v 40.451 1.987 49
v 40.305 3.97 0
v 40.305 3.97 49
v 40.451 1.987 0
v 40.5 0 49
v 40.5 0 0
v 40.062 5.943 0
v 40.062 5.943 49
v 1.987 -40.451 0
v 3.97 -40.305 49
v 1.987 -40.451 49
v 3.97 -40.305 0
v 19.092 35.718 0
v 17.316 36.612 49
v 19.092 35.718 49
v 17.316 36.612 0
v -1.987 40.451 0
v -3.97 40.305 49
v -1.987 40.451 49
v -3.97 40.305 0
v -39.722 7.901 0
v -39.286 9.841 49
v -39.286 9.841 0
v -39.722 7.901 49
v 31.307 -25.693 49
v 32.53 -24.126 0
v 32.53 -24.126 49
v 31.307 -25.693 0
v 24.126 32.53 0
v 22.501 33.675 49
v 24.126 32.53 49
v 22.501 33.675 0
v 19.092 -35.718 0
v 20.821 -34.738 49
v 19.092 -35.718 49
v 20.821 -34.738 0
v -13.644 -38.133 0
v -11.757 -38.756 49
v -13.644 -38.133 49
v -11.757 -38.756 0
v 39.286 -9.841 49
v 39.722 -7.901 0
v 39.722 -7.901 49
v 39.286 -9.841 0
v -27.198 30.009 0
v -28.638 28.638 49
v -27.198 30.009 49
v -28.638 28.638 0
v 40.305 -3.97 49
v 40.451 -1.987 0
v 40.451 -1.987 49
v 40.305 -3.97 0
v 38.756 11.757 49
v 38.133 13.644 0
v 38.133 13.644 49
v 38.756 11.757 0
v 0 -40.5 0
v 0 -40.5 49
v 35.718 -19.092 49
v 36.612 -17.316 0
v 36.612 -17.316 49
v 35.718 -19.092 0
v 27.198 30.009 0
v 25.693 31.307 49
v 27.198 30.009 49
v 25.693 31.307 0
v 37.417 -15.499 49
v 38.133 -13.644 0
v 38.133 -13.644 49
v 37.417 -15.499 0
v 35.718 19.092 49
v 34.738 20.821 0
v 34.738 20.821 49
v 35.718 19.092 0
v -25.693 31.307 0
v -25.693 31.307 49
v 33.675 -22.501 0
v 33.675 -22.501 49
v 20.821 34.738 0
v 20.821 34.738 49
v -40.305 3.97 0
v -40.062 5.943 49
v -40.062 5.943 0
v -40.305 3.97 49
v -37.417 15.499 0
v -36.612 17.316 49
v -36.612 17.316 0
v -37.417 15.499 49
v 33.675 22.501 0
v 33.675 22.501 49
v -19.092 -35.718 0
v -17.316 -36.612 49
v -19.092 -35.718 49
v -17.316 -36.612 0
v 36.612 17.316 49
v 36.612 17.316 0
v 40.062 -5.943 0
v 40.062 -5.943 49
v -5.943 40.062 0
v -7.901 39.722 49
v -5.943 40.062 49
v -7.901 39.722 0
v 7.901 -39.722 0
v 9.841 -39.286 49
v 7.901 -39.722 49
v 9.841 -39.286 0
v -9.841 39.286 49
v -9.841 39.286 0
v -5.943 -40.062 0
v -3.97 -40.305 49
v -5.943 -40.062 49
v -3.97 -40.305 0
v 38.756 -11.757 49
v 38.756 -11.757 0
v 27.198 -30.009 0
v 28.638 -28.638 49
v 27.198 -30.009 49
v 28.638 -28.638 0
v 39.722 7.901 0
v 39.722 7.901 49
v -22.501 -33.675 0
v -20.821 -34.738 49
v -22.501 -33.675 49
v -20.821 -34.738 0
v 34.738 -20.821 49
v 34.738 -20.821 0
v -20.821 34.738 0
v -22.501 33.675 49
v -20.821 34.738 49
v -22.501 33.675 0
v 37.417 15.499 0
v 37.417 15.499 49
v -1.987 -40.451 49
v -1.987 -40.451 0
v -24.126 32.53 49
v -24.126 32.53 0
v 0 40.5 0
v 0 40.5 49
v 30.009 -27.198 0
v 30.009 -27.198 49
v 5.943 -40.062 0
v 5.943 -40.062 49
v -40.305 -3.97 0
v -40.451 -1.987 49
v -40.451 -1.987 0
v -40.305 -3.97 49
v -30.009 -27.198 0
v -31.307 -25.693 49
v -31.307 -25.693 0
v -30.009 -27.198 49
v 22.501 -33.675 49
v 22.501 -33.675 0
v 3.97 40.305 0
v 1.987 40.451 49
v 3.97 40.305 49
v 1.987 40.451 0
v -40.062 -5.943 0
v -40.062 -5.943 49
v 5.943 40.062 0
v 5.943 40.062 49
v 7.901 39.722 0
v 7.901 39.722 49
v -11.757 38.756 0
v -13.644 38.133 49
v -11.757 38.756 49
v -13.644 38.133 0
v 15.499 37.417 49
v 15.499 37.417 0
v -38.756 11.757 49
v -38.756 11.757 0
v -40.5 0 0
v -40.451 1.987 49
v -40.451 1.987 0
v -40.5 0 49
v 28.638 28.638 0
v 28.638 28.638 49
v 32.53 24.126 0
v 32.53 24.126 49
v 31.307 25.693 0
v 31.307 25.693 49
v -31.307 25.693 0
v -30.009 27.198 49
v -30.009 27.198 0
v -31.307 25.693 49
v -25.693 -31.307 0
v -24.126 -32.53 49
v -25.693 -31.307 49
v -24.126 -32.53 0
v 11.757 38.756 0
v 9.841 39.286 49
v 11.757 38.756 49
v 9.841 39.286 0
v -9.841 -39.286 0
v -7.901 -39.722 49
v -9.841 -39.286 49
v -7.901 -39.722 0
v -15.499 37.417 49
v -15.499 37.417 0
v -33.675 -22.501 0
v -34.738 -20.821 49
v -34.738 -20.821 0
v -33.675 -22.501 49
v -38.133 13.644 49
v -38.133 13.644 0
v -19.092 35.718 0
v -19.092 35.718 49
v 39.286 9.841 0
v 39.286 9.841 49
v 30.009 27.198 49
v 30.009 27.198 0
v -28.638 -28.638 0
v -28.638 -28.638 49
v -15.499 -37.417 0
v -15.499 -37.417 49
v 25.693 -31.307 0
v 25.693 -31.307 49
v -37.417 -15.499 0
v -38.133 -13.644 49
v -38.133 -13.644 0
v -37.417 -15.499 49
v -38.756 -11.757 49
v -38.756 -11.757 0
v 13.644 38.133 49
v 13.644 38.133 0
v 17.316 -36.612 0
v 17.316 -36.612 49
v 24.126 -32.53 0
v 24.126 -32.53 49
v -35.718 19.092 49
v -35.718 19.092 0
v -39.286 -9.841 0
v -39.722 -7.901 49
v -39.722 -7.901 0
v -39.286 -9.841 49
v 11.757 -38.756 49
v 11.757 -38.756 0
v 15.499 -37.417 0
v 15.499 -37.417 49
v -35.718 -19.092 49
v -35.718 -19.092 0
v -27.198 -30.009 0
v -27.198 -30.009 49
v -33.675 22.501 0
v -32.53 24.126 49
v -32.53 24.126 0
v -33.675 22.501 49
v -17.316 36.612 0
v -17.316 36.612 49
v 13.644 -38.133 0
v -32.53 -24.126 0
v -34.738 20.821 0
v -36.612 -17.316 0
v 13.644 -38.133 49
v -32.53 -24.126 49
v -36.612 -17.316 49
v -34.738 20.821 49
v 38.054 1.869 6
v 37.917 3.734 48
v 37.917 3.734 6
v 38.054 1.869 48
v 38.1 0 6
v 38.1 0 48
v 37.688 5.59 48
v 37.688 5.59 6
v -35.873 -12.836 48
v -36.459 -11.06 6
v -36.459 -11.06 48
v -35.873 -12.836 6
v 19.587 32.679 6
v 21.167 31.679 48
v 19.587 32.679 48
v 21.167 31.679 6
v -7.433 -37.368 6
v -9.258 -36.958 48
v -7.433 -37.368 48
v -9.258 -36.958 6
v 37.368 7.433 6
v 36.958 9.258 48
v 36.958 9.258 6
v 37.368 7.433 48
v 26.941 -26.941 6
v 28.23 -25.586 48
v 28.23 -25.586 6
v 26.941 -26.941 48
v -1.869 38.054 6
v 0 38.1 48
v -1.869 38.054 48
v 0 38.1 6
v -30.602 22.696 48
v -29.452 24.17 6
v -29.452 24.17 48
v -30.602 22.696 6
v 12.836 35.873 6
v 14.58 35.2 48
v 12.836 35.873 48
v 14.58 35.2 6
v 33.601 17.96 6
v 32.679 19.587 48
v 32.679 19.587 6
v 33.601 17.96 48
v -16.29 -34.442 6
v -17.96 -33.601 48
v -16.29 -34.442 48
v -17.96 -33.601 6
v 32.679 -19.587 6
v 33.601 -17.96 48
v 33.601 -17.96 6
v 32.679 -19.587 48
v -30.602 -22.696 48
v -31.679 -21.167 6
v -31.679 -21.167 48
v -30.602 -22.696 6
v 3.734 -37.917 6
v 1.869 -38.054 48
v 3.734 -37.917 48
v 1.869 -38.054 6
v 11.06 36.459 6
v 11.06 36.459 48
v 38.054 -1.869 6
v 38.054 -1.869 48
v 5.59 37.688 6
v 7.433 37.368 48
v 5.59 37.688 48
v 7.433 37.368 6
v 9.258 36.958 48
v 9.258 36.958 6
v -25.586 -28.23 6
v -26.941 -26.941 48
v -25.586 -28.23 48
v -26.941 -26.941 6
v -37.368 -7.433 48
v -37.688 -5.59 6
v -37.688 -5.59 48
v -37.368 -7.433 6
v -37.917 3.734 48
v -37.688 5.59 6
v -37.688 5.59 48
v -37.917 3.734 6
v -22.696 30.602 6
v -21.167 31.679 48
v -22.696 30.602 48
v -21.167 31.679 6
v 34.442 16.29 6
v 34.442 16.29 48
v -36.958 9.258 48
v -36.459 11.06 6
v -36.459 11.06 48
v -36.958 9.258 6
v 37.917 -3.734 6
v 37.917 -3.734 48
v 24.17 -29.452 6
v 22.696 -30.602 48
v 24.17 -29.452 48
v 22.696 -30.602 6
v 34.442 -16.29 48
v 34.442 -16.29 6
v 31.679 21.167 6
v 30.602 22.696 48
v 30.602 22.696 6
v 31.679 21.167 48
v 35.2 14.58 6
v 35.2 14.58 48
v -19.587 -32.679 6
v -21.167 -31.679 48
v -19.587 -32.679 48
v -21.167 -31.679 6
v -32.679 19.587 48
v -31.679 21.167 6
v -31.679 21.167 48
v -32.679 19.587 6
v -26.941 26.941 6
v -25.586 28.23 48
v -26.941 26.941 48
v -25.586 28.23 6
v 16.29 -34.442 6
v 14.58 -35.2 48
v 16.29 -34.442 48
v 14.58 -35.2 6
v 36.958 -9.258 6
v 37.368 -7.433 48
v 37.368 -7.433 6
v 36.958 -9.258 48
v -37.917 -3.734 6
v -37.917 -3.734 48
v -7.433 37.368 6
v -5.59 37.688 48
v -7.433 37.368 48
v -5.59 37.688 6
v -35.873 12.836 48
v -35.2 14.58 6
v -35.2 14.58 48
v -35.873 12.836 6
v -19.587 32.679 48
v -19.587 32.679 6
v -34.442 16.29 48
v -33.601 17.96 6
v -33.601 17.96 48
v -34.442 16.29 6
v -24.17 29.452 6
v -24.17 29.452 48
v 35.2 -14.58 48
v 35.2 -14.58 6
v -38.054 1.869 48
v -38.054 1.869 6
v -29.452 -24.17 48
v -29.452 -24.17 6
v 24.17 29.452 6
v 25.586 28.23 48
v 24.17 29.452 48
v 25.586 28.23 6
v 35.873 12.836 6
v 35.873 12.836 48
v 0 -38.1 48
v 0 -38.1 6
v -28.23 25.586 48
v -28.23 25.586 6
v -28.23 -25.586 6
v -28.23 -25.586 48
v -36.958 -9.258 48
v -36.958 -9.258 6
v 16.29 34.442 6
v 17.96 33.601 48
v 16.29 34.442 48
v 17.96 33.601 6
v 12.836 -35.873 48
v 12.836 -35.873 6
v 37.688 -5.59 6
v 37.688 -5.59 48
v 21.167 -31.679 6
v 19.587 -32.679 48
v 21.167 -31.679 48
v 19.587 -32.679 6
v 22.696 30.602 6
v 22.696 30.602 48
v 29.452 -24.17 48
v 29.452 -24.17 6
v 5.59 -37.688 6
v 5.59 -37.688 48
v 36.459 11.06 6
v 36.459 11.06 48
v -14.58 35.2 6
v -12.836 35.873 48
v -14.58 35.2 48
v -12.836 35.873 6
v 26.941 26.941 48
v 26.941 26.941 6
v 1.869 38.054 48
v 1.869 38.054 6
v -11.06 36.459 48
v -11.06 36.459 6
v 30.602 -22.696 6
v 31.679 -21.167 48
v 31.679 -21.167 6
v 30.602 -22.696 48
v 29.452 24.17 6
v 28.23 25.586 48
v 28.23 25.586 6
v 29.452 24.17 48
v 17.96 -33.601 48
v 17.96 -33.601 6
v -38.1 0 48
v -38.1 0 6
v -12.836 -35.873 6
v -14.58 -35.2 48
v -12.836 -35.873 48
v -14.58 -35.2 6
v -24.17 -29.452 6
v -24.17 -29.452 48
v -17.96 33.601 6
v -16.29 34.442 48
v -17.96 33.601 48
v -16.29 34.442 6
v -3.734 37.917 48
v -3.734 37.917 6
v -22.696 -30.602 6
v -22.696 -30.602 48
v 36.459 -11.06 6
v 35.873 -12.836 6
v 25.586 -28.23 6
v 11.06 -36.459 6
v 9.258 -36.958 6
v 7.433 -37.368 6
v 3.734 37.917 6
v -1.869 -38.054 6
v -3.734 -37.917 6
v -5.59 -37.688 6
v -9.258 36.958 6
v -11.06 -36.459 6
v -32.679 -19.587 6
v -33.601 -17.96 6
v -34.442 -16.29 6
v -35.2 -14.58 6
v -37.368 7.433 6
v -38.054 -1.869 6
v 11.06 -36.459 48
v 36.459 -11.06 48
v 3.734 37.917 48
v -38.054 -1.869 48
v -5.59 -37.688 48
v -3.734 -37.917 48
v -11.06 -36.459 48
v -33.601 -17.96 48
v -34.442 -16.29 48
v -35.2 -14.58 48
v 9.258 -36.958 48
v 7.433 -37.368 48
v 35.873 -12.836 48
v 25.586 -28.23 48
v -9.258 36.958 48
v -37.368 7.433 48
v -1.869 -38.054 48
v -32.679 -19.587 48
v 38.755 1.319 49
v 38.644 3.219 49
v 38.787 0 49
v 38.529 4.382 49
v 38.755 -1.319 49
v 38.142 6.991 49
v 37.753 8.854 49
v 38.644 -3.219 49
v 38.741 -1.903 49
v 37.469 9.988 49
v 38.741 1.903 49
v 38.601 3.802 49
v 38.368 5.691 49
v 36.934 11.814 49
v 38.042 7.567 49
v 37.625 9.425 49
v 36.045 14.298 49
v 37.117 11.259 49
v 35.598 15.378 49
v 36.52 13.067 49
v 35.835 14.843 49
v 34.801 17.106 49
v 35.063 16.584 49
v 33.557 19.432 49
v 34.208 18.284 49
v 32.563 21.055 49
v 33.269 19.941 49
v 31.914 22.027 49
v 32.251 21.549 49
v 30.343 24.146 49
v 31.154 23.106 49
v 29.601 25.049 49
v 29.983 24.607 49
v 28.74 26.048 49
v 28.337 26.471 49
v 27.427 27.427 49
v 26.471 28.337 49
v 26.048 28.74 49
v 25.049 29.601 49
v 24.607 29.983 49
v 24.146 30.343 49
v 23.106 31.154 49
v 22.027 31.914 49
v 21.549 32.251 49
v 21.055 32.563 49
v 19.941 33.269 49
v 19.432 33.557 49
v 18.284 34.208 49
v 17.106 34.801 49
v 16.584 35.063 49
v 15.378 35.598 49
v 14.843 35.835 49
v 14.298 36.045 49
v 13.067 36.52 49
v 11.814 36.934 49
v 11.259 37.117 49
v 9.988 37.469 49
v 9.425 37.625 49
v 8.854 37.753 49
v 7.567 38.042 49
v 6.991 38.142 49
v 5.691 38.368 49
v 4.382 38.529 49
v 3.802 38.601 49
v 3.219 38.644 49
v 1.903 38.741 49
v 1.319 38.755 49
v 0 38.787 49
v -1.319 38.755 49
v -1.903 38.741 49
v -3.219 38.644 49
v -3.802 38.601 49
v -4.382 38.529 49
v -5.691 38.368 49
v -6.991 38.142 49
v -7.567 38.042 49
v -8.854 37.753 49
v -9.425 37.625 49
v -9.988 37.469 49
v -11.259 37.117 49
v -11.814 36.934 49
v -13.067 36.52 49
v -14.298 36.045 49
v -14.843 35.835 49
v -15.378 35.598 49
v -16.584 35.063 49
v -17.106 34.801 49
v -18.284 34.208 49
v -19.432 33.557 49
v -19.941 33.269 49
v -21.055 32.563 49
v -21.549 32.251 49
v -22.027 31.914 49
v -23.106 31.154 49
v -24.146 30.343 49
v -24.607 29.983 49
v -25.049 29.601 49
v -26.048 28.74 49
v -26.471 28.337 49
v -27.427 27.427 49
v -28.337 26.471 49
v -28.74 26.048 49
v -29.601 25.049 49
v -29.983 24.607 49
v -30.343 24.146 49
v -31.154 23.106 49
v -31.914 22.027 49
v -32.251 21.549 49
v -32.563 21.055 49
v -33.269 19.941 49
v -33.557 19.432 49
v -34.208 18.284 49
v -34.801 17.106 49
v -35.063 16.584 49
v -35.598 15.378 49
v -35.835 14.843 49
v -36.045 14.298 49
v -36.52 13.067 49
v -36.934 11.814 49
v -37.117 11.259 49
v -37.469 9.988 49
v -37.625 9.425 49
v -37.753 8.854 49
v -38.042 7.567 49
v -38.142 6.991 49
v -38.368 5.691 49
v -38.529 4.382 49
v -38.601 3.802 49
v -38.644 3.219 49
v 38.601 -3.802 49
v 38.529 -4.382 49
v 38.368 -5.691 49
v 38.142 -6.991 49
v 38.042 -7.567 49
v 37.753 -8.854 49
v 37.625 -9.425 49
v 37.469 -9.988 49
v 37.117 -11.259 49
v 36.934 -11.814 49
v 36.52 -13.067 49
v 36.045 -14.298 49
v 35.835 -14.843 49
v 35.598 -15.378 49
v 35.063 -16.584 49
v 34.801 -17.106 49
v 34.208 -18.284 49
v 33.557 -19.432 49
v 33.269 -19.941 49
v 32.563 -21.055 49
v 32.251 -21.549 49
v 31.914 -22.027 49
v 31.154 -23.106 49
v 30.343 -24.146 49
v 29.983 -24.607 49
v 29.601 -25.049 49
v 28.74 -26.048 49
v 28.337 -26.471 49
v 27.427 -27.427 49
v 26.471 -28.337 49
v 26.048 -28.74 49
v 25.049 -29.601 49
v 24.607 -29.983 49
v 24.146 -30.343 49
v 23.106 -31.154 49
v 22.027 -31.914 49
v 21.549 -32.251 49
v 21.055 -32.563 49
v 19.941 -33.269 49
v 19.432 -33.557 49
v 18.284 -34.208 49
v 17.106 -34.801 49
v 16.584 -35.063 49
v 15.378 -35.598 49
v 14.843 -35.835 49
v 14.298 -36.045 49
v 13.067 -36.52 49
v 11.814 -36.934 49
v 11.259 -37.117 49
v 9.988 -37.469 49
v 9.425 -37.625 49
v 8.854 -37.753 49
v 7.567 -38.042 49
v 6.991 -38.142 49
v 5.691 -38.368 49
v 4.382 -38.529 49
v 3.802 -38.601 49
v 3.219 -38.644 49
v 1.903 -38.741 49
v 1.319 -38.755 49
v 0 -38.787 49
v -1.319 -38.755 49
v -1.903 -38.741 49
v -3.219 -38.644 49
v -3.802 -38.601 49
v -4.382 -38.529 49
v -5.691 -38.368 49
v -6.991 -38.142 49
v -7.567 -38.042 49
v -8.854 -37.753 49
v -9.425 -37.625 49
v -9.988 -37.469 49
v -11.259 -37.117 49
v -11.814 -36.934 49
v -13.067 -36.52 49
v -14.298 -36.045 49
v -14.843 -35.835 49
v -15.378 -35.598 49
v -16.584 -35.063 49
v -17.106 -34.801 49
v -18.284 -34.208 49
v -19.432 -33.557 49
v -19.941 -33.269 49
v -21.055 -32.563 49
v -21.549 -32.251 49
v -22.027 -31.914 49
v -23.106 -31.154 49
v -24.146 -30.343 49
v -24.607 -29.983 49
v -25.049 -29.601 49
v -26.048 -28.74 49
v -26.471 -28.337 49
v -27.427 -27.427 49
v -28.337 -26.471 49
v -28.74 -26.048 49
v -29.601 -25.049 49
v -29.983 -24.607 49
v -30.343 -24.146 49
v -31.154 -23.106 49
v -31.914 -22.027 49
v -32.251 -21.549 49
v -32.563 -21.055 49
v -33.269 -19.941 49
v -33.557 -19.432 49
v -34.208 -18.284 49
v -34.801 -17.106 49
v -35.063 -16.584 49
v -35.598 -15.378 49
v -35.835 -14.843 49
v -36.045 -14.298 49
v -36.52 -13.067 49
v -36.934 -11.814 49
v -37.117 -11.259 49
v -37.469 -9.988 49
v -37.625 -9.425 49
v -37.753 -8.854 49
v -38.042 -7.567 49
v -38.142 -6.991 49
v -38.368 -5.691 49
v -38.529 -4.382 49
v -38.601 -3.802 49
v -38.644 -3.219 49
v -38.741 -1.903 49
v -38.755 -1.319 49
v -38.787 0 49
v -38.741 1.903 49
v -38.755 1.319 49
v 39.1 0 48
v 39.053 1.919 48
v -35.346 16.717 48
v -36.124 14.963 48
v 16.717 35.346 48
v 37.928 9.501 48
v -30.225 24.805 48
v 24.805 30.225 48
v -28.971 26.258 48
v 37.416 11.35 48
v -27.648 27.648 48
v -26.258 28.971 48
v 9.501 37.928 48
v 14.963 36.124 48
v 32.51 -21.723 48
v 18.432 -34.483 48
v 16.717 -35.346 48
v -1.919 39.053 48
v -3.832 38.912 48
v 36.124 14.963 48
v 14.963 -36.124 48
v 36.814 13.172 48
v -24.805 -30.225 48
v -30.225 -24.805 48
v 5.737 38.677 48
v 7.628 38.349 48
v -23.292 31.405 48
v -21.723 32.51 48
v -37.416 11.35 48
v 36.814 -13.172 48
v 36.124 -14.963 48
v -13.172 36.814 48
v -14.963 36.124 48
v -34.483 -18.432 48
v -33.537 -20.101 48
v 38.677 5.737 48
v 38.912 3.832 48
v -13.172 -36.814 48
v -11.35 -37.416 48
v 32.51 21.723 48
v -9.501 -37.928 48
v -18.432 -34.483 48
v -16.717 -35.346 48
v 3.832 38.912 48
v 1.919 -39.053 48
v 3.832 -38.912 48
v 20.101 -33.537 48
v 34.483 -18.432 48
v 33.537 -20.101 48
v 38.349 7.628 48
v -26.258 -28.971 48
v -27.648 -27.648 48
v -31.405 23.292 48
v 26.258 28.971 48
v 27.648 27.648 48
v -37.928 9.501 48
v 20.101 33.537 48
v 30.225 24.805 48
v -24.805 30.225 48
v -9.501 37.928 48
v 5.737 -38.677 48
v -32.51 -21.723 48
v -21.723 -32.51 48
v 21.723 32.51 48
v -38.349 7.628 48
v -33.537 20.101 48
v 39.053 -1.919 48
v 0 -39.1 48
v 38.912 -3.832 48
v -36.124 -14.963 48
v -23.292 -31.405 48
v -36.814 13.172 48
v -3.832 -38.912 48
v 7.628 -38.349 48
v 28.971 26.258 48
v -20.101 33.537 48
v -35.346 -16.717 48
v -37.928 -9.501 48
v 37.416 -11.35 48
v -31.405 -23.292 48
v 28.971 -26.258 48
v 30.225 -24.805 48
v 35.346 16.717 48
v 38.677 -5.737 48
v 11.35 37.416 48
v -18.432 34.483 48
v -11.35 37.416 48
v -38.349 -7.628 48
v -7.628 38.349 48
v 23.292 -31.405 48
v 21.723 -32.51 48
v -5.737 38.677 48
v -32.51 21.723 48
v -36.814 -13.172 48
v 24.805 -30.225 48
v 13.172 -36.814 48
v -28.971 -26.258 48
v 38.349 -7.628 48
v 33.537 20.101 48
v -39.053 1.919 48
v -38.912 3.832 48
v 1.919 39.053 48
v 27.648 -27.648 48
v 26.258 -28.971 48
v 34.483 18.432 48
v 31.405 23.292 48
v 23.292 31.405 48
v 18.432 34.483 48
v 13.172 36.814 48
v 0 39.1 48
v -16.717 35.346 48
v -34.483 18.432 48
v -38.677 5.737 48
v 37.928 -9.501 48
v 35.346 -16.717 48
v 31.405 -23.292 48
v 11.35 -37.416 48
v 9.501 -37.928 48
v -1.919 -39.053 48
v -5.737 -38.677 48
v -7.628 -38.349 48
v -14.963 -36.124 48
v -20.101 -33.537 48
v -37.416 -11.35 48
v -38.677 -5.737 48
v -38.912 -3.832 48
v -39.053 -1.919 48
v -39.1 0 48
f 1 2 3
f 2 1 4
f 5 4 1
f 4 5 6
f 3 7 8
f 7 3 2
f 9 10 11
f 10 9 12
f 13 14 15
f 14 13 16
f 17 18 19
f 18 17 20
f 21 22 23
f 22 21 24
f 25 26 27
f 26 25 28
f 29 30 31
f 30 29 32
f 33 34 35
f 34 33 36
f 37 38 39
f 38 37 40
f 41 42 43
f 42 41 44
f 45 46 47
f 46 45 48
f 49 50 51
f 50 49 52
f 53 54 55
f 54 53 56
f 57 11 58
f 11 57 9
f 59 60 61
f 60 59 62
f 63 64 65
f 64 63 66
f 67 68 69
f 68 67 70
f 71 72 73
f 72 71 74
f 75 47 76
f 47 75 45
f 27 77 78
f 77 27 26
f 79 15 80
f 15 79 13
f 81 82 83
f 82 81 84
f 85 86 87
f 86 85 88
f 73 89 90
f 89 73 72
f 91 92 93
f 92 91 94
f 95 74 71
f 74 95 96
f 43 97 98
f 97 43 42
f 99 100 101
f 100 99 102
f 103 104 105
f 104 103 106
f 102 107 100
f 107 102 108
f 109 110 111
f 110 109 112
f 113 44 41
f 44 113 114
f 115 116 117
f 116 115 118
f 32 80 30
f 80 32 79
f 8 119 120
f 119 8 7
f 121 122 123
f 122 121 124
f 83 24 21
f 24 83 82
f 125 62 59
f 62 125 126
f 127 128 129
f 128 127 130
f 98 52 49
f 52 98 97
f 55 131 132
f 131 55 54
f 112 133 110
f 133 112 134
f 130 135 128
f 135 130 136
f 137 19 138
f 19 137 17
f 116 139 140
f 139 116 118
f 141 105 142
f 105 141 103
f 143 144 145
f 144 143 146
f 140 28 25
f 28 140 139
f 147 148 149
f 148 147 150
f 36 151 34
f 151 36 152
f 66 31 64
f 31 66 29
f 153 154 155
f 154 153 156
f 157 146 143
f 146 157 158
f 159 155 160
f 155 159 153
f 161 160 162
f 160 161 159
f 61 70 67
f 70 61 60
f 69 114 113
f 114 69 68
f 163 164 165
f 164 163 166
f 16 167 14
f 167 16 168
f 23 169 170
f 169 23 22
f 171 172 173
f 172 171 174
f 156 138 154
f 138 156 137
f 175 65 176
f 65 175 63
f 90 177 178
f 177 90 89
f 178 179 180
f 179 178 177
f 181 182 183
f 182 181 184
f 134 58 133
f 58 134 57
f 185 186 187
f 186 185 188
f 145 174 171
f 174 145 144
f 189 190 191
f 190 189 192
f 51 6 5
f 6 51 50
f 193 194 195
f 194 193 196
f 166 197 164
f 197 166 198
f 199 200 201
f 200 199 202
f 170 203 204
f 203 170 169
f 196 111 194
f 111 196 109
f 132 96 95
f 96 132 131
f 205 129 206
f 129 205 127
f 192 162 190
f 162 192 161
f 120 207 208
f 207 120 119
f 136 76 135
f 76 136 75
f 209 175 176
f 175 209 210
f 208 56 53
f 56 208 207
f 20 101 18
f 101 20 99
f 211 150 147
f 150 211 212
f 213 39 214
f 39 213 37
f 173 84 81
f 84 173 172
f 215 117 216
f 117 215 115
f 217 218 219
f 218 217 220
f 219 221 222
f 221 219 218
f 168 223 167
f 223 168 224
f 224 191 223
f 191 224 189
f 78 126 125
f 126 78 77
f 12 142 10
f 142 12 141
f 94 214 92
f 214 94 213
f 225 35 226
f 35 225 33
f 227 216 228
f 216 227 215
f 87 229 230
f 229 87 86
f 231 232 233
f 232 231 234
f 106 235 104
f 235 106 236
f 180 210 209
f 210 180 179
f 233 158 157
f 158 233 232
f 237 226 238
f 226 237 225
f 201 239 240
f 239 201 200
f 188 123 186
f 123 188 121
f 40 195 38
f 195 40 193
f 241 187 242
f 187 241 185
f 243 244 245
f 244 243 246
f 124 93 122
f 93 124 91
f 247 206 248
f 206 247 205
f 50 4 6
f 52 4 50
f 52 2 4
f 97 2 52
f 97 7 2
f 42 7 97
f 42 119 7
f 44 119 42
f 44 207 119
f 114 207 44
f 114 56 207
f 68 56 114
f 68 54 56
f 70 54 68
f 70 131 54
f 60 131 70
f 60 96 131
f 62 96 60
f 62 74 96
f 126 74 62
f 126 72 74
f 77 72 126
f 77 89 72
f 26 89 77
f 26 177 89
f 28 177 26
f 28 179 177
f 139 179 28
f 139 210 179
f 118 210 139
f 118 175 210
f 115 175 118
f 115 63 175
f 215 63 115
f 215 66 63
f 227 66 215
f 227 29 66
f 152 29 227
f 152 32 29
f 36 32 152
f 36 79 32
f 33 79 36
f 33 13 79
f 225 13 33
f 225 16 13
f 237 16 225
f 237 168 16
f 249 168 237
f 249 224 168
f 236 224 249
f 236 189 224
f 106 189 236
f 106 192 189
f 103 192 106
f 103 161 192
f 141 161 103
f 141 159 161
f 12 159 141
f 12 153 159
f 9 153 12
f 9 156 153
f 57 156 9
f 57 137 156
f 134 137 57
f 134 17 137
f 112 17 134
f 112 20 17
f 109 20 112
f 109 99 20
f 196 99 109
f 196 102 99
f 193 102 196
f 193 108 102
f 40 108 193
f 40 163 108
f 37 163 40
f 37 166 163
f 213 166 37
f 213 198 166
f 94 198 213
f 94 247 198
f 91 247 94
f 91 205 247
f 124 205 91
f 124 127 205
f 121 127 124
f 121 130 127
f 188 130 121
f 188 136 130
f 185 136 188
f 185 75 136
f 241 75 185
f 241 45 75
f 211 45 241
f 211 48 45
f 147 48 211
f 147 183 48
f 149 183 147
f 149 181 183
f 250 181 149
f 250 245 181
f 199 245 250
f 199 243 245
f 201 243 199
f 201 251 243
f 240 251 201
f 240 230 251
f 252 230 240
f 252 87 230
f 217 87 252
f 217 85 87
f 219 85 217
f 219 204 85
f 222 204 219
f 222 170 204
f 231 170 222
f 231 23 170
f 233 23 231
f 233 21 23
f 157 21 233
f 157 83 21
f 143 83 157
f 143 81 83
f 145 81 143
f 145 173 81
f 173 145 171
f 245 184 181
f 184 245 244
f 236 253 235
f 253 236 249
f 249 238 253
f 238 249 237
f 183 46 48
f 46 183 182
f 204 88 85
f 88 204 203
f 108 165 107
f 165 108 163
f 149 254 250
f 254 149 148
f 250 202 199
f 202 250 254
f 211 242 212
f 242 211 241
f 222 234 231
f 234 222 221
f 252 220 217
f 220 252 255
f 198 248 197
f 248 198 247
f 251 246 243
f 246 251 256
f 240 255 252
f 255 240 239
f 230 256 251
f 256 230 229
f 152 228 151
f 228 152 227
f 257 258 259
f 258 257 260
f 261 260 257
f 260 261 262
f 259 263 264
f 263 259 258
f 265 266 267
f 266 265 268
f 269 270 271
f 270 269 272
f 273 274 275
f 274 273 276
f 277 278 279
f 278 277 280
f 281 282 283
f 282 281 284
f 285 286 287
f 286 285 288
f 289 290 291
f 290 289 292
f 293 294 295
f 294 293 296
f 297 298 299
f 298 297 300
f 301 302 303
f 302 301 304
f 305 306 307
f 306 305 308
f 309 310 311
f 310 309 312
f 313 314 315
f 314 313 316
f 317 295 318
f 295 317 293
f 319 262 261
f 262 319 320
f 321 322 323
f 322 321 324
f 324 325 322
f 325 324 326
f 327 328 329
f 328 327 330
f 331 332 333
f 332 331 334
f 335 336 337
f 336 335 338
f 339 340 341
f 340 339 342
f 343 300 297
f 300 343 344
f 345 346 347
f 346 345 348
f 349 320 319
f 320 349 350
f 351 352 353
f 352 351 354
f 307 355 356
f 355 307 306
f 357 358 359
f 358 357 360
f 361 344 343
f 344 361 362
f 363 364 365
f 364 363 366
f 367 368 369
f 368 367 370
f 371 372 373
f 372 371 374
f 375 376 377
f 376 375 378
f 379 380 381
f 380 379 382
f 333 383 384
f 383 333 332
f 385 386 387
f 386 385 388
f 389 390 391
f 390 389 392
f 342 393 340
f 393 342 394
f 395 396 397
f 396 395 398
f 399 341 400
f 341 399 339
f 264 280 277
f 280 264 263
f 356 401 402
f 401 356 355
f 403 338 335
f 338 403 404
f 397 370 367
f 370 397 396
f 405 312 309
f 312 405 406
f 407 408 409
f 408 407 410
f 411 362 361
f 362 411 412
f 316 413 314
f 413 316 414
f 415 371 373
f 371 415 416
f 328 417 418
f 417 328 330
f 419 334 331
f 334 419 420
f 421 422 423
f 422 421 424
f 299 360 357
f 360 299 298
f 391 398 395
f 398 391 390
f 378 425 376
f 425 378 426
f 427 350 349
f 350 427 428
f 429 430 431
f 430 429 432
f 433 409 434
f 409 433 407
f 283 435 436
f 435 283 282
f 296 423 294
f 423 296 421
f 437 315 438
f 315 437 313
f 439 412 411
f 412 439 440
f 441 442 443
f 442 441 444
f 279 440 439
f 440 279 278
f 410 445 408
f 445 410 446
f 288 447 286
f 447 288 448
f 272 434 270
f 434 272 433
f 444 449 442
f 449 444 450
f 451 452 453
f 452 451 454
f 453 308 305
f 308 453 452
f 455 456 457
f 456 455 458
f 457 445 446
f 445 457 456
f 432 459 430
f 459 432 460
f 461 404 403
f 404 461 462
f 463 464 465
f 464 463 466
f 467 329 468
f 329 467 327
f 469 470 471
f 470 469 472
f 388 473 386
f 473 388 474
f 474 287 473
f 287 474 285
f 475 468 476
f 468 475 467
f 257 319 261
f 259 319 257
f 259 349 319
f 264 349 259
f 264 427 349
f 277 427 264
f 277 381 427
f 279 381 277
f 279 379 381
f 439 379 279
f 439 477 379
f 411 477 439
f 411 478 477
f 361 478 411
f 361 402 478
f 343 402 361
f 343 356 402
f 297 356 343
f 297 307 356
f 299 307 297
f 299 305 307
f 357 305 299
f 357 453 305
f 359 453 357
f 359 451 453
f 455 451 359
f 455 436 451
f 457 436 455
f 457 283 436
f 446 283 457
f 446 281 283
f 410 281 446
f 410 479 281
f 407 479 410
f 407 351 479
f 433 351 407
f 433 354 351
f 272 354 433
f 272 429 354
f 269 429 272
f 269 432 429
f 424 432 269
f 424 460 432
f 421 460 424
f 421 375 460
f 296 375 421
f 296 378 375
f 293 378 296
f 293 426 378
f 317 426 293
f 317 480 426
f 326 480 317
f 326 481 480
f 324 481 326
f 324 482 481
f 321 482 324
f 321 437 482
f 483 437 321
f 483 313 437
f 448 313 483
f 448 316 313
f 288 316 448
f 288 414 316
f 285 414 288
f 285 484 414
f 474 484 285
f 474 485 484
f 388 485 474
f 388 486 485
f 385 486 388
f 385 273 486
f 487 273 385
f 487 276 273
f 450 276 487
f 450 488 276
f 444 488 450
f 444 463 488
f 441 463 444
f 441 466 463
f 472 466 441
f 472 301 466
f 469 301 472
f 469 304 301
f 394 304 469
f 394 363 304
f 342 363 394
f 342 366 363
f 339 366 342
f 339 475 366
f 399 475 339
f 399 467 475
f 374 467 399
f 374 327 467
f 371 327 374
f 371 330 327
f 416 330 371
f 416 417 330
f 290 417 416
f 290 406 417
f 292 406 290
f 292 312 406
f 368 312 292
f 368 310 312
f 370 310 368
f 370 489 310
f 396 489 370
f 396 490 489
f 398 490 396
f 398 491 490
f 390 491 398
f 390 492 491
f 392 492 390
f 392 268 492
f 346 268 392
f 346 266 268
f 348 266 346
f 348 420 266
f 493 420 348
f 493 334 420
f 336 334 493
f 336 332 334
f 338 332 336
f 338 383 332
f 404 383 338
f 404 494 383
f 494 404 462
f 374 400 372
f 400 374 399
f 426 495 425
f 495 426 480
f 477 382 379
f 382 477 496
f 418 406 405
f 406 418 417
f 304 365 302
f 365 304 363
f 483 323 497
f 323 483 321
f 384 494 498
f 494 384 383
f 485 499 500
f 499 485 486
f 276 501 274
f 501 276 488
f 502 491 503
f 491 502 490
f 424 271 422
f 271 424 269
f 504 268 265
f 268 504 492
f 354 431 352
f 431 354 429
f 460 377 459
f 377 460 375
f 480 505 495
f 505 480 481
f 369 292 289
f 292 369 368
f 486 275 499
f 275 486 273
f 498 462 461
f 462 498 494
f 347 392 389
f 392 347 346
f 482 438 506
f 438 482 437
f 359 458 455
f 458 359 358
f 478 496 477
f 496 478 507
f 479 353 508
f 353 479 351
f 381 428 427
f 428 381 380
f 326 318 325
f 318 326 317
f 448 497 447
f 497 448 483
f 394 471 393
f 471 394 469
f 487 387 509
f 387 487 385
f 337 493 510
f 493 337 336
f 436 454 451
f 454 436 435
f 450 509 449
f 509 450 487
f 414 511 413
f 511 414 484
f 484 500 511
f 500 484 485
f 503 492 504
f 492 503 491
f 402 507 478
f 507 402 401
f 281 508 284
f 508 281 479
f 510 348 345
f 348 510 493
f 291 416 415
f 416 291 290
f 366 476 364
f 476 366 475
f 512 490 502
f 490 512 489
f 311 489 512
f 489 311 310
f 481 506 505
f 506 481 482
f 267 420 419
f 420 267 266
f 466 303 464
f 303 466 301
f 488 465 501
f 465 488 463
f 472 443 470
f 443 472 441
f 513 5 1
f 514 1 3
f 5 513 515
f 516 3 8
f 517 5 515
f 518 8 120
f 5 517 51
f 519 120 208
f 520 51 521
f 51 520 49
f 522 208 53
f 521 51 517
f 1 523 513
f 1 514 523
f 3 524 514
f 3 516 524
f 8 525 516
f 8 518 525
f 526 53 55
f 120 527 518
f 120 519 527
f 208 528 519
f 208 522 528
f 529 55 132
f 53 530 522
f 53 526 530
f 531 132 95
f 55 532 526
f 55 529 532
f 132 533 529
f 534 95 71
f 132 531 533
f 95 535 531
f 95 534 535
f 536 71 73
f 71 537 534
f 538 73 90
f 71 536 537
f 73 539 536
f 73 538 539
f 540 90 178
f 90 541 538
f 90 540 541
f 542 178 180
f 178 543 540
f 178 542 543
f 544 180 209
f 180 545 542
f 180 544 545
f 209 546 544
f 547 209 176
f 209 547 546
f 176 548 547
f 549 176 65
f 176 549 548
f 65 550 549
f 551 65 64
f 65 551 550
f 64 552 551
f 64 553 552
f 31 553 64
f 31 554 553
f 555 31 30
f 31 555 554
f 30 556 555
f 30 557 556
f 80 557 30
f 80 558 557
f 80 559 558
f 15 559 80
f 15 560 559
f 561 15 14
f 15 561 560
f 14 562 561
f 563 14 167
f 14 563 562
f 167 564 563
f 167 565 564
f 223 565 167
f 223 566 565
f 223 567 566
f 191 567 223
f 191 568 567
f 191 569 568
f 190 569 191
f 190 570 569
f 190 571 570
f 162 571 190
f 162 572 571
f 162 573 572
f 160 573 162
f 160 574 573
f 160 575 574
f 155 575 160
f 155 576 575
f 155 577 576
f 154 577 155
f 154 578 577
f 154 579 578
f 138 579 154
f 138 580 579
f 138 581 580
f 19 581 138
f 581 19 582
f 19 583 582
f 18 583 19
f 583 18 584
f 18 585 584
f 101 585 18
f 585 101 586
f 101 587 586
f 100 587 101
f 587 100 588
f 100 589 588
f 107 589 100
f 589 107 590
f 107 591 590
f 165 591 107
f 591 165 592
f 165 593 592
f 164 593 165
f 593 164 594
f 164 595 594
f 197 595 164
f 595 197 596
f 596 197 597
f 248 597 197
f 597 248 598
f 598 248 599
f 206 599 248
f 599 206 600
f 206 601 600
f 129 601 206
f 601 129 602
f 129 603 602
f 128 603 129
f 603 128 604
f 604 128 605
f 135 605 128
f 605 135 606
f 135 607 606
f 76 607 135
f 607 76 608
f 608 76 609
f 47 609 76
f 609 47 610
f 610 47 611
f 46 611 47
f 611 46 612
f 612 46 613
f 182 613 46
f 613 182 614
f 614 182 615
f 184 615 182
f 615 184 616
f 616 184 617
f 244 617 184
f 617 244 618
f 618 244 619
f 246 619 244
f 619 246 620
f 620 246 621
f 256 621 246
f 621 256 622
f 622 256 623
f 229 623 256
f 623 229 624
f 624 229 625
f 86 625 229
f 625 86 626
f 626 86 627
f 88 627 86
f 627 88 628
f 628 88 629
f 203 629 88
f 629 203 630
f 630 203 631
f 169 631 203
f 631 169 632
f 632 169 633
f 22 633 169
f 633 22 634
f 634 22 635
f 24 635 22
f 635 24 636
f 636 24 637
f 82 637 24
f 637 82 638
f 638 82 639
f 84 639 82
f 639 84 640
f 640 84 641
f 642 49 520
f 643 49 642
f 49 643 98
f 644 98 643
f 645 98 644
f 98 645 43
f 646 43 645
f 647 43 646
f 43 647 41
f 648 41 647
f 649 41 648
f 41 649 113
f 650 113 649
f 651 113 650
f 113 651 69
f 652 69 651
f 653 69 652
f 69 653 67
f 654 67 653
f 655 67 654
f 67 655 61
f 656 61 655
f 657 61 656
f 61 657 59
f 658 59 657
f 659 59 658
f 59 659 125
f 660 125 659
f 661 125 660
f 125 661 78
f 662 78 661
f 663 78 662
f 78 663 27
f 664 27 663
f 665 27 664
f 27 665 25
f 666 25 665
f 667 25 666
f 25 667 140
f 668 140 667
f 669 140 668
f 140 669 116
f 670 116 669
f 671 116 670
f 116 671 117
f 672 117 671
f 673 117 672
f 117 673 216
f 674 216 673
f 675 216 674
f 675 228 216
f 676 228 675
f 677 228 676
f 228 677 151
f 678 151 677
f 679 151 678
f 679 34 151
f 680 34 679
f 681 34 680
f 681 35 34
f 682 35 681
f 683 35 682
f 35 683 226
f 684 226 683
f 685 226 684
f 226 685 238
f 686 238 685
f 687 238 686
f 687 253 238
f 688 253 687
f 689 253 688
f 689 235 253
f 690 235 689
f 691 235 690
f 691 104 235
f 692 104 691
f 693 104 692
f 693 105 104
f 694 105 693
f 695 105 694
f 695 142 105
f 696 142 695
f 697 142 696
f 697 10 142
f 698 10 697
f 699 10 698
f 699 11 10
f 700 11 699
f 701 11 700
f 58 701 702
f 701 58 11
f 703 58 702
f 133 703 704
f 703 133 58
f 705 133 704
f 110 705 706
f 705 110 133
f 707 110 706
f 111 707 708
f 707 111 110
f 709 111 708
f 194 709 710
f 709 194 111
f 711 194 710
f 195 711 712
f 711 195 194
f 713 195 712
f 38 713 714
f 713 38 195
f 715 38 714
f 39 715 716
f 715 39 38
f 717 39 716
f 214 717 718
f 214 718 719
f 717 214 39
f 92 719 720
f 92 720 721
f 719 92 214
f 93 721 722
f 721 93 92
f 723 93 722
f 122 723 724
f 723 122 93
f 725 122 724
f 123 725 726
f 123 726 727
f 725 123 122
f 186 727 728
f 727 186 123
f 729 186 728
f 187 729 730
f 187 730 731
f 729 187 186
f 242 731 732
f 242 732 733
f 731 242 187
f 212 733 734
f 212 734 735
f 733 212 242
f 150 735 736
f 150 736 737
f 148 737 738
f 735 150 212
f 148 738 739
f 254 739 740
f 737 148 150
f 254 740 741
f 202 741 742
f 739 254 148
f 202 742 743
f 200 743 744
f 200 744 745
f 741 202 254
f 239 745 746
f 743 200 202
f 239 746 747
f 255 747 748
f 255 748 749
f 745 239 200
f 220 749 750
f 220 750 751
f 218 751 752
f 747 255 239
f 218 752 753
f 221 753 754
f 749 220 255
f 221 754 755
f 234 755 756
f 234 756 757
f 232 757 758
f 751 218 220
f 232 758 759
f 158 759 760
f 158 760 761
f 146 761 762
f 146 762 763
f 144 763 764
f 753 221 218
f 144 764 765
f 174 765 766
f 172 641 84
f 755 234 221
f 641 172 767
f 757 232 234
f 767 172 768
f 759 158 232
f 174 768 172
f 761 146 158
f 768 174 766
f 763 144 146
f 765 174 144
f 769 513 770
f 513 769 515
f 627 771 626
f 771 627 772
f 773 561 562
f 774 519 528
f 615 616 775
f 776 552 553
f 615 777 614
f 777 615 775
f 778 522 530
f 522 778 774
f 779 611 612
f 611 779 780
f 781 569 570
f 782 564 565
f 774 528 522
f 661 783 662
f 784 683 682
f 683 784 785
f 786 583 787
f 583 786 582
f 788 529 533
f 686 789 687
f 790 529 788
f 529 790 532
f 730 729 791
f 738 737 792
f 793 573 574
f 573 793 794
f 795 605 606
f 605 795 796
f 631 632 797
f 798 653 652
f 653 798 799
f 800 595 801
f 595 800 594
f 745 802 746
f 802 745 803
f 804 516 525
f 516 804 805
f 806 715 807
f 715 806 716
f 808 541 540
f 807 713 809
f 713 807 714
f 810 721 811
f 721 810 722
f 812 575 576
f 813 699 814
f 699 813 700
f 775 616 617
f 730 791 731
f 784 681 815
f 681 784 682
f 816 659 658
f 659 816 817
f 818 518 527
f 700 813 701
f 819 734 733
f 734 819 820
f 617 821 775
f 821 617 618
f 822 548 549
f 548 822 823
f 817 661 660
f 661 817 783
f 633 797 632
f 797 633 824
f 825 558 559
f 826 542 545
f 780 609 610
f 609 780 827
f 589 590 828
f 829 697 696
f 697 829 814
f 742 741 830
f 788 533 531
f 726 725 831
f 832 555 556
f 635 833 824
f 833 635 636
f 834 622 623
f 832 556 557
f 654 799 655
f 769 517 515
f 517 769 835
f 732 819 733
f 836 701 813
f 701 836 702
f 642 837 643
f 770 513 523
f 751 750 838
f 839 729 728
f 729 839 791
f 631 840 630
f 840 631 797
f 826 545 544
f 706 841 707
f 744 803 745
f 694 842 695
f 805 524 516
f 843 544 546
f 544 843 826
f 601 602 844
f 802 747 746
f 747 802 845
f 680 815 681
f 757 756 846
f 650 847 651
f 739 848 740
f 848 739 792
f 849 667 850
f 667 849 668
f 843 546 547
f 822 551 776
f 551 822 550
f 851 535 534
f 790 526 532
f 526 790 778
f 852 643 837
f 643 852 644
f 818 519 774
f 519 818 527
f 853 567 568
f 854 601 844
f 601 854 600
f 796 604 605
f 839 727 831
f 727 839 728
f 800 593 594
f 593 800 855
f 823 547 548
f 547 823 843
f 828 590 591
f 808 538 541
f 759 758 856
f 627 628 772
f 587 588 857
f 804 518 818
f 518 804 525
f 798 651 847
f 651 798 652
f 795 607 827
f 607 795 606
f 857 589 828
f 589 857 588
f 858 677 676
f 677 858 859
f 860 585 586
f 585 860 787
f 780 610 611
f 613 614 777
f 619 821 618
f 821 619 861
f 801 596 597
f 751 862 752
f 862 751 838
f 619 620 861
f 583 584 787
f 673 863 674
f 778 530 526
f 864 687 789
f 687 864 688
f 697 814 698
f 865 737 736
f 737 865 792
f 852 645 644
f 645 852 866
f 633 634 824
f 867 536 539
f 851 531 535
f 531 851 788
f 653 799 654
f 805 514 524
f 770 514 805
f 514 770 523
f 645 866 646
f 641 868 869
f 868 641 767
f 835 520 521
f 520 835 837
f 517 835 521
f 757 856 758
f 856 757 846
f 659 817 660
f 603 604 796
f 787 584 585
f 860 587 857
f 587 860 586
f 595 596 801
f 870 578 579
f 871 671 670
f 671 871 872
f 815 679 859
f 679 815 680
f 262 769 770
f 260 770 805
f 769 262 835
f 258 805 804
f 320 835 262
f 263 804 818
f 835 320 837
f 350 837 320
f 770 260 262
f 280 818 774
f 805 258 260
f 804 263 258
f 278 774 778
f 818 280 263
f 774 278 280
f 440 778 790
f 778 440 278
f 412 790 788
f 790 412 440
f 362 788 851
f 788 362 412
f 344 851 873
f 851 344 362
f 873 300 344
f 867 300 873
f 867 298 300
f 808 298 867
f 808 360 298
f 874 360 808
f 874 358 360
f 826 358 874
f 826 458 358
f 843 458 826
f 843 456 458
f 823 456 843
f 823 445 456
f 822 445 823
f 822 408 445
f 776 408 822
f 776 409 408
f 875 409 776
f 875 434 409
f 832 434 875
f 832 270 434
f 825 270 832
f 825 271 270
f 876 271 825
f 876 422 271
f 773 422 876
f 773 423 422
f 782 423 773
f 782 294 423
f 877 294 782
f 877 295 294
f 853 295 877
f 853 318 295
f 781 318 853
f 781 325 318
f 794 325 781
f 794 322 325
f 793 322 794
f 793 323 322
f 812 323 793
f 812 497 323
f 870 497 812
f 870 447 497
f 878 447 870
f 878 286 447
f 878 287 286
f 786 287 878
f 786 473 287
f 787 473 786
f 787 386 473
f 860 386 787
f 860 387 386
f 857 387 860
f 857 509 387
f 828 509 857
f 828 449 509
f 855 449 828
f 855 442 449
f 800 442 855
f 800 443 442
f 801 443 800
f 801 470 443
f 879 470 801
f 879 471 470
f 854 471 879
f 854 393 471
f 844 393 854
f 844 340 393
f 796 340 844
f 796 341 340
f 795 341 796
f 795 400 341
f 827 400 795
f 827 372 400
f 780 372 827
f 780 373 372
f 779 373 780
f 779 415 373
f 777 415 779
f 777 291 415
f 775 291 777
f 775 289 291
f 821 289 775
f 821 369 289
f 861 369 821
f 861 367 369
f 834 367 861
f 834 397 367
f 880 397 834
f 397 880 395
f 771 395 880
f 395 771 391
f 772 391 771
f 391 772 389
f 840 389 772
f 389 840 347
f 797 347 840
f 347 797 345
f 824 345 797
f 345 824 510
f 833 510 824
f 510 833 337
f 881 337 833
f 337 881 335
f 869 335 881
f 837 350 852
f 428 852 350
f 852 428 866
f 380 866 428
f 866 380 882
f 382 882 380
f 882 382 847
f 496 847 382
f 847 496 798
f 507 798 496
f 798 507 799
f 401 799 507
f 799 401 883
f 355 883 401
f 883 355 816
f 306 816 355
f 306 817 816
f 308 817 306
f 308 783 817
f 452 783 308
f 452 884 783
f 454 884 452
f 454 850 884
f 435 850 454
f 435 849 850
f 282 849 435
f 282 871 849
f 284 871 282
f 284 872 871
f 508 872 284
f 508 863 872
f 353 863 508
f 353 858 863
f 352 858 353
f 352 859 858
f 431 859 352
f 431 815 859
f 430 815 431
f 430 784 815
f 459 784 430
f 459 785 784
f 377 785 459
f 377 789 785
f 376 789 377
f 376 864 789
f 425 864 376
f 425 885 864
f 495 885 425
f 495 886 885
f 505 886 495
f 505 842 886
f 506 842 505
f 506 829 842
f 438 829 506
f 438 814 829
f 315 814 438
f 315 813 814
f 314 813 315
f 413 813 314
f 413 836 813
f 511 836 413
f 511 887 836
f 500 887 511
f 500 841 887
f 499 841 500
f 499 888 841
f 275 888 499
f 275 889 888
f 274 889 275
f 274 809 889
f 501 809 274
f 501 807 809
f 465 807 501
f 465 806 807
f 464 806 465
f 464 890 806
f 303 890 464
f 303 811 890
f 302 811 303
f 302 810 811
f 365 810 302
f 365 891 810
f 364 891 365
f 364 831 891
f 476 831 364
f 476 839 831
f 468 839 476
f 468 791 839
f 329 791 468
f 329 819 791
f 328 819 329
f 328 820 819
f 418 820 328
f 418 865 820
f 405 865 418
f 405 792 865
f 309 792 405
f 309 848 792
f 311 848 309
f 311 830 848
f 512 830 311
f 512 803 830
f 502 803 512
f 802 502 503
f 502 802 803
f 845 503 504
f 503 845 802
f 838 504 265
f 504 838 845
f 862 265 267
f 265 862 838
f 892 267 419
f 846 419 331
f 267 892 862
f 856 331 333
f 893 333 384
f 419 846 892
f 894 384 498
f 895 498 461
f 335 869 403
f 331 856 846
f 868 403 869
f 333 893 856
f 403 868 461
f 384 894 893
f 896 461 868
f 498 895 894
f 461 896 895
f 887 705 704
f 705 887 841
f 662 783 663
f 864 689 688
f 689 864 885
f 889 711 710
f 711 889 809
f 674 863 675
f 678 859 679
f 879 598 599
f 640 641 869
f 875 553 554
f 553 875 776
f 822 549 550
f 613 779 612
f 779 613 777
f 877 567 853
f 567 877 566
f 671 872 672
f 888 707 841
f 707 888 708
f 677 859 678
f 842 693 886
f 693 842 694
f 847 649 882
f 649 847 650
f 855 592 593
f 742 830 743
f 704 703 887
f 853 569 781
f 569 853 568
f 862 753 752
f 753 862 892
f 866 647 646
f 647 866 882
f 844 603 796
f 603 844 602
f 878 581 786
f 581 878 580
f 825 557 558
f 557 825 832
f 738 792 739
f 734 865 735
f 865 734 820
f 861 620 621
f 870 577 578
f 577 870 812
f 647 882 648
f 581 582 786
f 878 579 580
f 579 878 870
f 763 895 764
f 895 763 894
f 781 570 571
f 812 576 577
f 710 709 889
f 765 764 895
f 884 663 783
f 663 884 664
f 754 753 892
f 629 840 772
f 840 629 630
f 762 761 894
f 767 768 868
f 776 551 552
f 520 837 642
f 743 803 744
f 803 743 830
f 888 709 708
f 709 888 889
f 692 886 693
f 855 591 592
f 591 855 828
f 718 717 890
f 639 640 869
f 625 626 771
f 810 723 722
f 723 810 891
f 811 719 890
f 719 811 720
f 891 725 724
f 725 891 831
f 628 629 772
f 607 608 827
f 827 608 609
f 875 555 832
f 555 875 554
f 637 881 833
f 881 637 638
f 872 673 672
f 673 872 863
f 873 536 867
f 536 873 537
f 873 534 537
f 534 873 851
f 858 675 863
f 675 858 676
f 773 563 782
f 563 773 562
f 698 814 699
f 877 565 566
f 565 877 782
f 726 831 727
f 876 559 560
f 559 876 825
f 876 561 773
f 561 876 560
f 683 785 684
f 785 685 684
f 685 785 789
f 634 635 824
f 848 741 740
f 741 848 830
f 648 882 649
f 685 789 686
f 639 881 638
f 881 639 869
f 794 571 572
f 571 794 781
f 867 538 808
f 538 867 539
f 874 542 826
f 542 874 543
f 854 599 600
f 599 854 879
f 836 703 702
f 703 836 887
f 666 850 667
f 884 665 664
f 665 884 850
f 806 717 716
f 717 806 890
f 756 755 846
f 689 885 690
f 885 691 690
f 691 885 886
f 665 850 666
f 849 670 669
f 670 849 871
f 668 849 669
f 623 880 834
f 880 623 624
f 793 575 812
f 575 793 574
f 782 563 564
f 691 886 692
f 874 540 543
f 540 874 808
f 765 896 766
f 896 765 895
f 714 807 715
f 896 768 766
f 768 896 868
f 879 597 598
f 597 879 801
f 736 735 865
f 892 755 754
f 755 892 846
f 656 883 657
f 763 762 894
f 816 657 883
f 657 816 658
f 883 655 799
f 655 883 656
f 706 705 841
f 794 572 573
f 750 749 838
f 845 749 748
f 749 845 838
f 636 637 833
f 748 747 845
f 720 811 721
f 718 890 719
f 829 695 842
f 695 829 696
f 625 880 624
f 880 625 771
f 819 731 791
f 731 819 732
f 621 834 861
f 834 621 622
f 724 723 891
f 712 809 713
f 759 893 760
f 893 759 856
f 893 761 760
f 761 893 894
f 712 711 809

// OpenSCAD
$fn=128;

// HT 75 cap (approximate dimensions)
// Nominal: DN75 (OD ~75mm). Cap with socket and internal stop.
// Units: mm

// -------- Parameters --------
od_pipe = 75;          // outer diameter of pipe
wall   = 2.7;          // typical HT wall thickness
id_pipe = od_pipe - 2*wall;

socket_depth = 45;     // insertion depth
cap_top_thk  = 6;      // thickness of closed end
outer_lip    = 3;      // extra outer thickness for cap body
inner_clear  = 0.6;    // clearance for pipe insertion

// Derived
od_cap = od_pipe + 2*outer_lip;     // outer diameter of cap body
id_socket = od_pipe + 2*inner_clear; // inner diameter of socket (fits over pipe)
h_total = socket_depth + cap_top_thk;

// Internal stop ring (prevents pipe from going too far)
stop_thk = 3.0;
stop_height = 3.0;
stop_z = socket_depth - stop_height; // located near bottom of socket
stop_id = id_socket - 2*stop_thk;    // smaller opening at stop

// Small outer chamfer at mouth
mouth_chamfer_h = 2.0;
mouth_chamfer_w = 1.5;

// -------- Model --------
module ht75_cap() {
    difference() {
        // Outer body
        union() {
            cylinder(h=h_total, d=od_cap);

            // Outer mouth chamfer (add material then subtract to shape via difference below)
            // We'll shape by subtracting a cone from the outside edge.
        }

        // Hollow socket cavity
        translate([0,0,cap_top_thk])
            cylinder(h=socket_depth + 0.2, d=id_socket);

        // Create internal stop: reduce diameter for last few mm
        translate([0,0,cap_top_thk + stop_z])
            cylinder(h=stop_height + 0.2, d=stop_id);

        // Outer mouth chamfer subtraction
        translate([0,0,h_total - mouth_chamfer_h])
            difference() {
                // subtract a frustum from the outer rim
                cylinder(h=mouth_chamfer_h + 0.2, d1=od_cap + 2*mouth_chamfer_w, d2=od_cap);
                // keep only the part that intersects the cap (by subtracting nothing else)
            }

        // Slight inner lead-in chamfer for easier insertion
        translate([0,0,cap_top_thk + socket_depth - 3])
            cylinder(h=3.2, d1=id_socket + 2.0, d2=id_socket);
    }
}

ht75_cap();
